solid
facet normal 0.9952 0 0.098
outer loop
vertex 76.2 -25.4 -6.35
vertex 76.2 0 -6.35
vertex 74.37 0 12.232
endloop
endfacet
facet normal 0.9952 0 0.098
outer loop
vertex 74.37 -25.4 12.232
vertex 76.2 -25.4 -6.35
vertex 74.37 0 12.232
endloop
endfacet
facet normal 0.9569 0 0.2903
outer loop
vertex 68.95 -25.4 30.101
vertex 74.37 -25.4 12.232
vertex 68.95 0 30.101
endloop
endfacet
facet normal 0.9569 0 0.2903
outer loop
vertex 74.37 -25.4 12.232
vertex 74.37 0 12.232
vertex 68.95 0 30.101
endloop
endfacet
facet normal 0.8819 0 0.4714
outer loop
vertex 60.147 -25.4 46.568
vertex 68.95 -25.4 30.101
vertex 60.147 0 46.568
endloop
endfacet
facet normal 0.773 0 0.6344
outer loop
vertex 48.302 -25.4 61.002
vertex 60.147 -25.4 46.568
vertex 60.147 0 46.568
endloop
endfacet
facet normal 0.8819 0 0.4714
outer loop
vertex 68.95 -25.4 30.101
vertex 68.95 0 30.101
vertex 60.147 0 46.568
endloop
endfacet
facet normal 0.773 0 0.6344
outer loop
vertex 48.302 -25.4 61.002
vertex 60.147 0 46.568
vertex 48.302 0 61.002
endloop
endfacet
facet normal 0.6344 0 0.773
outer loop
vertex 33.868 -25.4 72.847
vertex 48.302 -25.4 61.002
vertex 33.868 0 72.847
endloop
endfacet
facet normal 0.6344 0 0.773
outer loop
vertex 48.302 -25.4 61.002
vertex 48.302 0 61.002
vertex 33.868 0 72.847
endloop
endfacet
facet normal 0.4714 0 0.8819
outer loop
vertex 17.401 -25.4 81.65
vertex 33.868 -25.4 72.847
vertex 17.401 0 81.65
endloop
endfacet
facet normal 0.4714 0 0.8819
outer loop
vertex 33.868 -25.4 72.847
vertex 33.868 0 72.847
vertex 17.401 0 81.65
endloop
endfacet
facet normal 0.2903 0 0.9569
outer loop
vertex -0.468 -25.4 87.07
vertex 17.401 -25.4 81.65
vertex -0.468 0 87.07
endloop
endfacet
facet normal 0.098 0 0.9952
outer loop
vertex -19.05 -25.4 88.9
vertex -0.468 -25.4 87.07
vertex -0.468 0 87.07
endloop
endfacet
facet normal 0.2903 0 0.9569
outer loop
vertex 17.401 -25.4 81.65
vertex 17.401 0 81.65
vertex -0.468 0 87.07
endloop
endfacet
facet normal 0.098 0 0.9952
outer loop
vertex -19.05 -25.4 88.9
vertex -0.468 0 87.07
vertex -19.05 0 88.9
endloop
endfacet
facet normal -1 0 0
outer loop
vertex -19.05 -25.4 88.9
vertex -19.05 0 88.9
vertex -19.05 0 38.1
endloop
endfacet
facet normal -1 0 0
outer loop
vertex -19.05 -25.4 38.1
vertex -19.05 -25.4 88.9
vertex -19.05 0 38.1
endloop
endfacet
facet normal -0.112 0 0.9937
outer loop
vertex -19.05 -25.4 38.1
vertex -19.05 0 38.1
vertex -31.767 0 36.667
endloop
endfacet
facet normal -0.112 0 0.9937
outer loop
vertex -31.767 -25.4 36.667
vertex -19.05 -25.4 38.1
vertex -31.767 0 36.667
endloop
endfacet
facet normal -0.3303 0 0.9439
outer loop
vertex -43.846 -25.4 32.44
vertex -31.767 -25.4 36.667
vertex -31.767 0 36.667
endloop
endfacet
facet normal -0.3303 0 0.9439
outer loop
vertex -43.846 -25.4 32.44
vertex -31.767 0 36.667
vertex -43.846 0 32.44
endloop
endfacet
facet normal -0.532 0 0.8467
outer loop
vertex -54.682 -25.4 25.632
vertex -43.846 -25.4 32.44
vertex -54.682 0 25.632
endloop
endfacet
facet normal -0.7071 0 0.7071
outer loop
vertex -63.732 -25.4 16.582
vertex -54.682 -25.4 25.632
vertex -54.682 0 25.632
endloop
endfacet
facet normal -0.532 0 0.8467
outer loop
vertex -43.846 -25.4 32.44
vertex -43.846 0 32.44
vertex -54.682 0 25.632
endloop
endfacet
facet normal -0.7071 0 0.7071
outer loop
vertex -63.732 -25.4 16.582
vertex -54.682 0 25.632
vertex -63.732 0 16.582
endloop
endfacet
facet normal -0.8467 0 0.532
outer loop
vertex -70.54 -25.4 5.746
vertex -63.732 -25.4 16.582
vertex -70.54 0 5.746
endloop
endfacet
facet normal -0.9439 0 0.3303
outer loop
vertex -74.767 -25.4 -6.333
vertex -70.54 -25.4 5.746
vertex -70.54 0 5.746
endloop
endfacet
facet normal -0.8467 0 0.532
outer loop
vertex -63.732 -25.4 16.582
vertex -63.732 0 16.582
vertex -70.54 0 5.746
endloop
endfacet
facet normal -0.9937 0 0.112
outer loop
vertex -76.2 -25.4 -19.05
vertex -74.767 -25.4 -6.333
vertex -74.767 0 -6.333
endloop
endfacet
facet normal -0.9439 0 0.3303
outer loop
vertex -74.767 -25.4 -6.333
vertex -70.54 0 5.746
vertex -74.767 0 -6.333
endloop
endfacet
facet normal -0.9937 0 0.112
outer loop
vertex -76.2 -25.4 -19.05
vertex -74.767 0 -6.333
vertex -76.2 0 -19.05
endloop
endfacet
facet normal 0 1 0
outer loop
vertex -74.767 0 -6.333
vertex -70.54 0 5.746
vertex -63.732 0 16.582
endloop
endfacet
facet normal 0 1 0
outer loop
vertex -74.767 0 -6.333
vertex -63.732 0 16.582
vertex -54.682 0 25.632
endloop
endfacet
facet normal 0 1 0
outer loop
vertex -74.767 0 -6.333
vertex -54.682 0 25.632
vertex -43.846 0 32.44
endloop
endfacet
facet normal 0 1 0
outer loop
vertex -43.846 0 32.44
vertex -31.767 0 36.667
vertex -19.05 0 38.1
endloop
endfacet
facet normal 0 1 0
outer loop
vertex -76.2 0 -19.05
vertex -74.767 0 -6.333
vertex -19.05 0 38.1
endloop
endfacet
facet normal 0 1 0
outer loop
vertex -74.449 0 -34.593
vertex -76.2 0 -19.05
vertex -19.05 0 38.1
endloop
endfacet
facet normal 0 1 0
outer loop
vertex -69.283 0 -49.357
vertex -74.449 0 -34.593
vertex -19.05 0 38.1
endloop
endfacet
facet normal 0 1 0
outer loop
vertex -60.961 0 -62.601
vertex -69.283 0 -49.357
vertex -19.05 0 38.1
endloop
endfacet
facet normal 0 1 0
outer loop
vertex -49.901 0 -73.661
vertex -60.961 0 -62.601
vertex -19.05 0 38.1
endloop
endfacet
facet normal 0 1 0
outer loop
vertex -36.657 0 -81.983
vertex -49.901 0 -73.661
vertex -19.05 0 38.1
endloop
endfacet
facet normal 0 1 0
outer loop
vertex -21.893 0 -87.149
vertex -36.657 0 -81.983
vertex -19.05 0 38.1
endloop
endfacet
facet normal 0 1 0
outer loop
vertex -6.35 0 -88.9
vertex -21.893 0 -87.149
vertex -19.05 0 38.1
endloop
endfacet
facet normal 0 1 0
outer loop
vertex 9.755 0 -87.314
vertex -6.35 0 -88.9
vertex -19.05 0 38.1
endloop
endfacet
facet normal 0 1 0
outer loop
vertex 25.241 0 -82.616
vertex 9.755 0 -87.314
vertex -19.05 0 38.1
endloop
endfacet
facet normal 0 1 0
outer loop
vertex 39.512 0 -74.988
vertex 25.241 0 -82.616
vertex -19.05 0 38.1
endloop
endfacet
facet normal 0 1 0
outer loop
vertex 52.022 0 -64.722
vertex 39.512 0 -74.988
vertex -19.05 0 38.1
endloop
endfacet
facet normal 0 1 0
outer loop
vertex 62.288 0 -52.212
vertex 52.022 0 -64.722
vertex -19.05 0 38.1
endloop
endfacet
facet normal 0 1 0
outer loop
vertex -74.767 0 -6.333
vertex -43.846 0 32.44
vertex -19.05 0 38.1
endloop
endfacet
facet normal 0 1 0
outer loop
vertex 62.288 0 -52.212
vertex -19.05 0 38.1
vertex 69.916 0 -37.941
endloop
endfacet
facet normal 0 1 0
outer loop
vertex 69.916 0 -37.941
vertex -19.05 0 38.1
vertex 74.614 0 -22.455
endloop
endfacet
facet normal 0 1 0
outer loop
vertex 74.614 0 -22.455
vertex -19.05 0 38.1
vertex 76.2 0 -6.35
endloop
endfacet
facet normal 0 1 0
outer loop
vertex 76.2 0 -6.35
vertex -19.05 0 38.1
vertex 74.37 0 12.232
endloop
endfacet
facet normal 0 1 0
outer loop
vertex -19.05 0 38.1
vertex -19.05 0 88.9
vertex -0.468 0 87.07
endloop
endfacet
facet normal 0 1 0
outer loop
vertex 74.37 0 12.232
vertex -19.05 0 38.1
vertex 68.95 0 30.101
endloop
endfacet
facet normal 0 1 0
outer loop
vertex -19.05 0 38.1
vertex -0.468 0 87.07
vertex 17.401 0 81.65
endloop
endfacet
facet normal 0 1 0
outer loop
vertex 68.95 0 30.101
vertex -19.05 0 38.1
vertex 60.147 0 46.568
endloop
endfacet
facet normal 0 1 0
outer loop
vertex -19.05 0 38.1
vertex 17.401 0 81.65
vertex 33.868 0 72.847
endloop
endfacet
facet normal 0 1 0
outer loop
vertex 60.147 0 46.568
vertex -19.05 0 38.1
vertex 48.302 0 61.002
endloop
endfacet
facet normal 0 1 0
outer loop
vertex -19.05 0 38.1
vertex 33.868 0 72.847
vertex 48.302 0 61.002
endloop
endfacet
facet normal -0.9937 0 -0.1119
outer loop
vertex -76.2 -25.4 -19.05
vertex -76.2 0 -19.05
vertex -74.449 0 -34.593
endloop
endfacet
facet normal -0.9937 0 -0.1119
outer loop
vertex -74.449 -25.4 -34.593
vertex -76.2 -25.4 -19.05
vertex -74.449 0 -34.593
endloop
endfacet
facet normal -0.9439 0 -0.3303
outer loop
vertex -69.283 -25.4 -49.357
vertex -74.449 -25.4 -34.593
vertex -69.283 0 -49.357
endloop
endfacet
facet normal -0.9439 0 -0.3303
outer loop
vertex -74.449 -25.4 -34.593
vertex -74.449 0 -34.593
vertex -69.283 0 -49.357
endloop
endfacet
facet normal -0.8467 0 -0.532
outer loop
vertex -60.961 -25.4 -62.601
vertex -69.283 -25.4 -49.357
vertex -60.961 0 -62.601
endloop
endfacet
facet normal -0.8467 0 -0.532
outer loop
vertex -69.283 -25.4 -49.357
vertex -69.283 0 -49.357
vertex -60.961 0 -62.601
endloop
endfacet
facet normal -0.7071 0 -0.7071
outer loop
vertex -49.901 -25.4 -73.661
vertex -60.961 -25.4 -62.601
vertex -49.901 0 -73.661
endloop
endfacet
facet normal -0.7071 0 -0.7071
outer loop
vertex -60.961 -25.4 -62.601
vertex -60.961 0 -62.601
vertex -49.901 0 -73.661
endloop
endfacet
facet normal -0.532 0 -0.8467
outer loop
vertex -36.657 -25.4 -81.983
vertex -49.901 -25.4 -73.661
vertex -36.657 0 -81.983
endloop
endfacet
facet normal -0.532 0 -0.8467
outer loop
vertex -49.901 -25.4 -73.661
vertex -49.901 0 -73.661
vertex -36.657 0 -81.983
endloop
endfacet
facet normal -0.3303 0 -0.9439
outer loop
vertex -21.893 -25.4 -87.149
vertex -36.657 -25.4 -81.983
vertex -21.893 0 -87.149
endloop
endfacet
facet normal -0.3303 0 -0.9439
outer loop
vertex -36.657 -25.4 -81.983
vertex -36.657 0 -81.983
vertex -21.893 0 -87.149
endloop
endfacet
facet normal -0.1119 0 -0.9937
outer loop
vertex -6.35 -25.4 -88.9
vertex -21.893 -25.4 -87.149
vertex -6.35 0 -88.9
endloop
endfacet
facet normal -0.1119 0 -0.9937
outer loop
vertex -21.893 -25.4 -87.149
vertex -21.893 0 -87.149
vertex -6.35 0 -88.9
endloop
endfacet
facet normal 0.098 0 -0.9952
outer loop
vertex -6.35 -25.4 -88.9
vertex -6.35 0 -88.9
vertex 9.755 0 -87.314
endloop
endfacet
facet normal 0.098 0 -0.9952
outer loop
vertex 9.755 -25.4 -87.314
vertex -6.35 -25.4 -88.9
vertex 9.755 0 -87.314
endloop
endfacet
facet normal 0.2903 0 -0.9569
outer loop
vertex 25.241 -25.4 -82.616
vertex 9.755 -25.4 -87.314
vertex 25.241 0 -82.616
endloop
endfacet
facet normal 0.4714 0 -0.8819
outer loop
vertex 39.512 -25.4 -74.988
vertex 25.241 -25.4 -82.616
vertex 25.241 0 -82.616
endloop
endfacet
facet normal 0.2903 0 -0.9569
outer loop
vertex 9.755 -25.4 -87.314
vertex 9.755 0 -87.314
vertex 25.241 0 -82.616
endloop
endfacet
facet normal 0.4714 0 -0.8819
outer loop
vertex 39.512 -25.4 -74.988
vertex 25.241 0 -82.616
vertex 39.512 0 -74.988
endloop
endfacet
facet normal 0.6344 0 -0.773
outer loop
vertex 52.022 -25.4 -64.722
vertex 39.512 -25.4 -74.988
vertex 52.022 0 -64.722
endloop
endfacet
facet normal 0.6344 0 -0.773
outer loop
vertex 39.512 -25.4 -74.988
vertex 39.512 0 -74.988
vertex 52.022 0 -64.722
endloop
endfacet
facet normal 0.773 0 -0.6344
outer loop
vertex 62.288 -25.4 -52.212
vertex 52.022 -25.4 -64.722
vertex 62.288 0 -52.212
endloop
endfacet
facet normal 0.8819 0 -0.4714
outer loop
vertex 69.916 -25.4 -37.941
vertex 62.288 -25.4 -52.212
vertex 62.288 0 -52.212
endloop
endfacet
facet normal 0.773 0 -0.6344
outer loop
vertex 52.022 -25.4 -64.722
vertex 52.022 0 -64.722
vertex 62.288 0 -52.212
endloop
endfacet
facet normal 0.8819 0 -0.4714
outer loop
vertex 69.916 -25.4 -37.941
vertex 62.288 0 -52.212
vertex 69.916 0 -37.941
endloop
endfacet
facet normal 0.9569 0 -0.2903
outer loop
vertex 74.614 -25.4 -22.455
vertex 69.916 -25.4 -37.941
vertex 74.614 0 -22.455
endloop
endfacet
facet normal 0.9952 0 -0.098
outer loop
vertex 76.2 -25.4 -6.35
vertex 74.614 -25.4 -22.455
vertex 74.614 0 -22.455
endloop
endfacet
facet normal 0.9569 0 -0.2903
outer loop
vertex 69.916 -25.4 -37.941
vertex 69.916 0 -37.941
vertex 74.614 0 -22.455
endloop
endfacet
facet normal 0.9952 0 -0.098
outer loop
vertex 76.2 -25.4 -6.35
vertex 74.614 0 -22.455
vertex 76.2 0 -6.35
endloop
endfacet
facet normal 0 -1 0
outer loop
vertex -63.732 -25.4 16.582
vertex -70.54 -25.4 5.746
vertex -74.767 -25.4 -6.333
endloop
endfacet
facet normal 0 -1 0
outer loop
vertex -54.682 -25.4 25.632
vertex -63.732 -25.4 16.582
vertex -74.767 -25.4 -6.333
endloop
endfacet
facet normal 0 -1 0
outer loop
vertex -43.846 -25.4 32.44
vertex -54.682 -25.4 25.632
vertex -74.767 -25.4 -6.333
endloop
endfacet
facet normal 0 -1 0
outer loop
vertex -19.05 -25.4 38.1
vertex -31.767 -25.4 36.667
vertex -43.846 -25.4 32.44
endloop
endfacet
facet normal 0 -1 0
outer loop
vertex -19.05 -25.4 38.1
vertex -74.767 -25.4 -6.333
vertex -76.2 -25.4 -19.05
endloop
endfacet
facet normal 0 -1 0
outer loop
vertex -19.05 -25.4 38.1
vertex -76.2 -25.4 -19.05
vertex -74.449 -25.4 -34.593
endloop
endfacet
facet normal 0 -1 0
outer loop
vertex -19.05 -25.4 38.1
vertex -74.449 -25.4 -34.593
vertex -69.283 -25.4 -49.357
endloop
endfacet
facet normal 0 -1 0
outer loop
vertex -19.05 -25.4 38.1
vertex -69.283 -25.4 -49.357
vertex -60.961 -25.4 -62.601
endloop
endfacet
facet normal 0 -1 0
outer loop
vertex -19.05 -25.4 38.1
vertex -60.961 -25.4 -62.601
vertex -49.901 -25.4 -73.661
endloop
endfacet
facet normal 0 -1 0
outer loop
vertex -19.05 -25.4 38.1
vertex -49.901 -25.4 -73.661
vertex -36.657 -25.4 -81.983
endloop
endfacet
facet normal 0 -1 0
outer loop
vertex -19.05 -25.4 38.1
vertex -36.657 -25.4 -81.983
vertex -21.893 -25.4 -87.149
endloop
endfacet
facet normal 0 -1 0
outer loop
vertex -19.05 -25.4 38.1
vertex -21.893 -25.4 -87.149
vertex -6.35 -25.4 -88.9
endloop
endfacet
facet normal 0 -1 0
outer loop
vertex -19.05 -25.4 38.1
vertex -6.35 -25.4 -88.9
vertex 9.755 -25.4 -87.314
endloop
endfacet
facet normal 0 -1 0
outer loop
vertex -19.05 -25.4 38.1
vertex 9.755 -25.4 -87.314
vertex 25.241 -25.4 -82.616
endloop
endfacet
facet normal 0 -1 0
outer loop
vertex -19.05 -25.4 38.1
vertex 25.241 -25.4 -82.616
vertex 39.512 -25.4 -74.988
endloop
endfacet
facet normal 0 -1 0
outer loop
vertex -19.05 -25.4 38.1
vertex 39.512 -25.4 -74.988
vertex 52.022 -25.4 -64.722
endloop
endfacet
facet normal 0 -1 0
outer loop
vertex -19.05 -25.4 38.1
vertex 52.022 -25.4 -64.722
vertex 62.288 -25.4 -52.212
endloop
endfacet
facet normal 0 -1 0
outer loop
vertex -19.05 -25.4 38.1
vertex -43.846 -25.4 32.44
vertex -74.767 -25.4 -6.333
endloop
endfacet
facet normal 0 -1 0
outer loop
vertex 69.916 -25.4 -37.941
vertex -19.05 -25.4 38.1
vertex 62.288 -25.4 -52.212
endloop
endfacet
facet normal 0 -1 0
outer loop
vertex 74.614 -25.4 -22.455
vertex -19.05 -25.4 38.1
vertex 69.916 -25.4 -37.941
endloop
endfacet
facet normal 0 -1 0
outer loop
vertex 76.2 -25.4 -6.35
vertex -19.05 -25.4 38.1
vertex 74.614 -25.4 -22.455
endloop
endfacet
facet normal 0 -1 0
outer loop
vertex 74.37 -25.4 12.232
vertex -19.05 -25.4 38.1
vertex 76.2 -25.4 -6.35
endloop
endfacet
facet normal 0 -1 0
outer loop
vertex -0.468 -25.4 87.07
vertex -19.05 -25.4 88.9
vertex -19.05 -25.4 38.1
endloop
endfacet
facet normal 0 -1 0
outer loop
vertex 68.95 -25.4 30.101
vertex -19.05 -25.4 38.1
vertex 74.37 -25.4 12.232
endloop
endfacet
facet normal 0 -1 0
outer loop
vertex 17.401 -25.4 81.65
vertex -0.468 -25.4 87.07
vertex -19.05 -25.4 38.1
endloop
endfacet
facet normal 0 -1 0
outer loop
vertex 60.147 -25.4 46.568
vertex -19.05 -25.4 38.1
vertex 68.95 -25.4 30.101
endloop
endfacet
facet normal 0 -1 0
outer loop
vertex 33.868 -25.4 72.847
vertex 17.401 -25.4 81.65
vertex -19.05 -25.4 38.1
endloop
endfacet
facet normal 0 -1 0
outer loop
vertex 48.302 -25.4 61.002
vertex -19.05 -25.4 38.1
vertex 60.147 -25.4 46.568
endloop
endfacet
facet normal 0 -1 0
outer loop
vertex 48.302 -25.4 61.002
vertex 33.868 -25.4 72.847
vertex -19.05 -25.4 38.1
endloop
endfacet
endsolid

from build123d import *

# Parameters (mm, degrees)
F0_W     = 12.7
F0_H     = 12.7
F1_DEPTH = 25.4


with BuildPart() as f1:
    # F0 (on Front) → F1 (new body)
    with BuildSketch(Plane.XZ):
        with BuildLine():
            Line((-19.05, 88.9), (-19.05, 38.1))
            ThreePointArc((-19.05, 38.1), (-59.461153, 21.361153), (-76.2, -19.05))
            ThreePointArc((-76.2, -19.05), (-55.741409, -68.441409), (-6.35, -88.9))
            ThreePointArc((-6.35, -88.9), (52.021665, -64.721665), (76.2, -6.35))
            ThreePointArc((76.2, -6.35), (48.301921, 61.001921), (-19.05, 88.9))
        make_face()
        with Locations((-12.7, -12.7)):
            Rectangle(F0_W, F0_H, mode=Mode.SUBTRACT)
        with Locations((-12.7, -12.7)):
            Rectangle(F0_W, F0_H)
    extrude(amount=F1_DEPTH)


solid = f1.part
